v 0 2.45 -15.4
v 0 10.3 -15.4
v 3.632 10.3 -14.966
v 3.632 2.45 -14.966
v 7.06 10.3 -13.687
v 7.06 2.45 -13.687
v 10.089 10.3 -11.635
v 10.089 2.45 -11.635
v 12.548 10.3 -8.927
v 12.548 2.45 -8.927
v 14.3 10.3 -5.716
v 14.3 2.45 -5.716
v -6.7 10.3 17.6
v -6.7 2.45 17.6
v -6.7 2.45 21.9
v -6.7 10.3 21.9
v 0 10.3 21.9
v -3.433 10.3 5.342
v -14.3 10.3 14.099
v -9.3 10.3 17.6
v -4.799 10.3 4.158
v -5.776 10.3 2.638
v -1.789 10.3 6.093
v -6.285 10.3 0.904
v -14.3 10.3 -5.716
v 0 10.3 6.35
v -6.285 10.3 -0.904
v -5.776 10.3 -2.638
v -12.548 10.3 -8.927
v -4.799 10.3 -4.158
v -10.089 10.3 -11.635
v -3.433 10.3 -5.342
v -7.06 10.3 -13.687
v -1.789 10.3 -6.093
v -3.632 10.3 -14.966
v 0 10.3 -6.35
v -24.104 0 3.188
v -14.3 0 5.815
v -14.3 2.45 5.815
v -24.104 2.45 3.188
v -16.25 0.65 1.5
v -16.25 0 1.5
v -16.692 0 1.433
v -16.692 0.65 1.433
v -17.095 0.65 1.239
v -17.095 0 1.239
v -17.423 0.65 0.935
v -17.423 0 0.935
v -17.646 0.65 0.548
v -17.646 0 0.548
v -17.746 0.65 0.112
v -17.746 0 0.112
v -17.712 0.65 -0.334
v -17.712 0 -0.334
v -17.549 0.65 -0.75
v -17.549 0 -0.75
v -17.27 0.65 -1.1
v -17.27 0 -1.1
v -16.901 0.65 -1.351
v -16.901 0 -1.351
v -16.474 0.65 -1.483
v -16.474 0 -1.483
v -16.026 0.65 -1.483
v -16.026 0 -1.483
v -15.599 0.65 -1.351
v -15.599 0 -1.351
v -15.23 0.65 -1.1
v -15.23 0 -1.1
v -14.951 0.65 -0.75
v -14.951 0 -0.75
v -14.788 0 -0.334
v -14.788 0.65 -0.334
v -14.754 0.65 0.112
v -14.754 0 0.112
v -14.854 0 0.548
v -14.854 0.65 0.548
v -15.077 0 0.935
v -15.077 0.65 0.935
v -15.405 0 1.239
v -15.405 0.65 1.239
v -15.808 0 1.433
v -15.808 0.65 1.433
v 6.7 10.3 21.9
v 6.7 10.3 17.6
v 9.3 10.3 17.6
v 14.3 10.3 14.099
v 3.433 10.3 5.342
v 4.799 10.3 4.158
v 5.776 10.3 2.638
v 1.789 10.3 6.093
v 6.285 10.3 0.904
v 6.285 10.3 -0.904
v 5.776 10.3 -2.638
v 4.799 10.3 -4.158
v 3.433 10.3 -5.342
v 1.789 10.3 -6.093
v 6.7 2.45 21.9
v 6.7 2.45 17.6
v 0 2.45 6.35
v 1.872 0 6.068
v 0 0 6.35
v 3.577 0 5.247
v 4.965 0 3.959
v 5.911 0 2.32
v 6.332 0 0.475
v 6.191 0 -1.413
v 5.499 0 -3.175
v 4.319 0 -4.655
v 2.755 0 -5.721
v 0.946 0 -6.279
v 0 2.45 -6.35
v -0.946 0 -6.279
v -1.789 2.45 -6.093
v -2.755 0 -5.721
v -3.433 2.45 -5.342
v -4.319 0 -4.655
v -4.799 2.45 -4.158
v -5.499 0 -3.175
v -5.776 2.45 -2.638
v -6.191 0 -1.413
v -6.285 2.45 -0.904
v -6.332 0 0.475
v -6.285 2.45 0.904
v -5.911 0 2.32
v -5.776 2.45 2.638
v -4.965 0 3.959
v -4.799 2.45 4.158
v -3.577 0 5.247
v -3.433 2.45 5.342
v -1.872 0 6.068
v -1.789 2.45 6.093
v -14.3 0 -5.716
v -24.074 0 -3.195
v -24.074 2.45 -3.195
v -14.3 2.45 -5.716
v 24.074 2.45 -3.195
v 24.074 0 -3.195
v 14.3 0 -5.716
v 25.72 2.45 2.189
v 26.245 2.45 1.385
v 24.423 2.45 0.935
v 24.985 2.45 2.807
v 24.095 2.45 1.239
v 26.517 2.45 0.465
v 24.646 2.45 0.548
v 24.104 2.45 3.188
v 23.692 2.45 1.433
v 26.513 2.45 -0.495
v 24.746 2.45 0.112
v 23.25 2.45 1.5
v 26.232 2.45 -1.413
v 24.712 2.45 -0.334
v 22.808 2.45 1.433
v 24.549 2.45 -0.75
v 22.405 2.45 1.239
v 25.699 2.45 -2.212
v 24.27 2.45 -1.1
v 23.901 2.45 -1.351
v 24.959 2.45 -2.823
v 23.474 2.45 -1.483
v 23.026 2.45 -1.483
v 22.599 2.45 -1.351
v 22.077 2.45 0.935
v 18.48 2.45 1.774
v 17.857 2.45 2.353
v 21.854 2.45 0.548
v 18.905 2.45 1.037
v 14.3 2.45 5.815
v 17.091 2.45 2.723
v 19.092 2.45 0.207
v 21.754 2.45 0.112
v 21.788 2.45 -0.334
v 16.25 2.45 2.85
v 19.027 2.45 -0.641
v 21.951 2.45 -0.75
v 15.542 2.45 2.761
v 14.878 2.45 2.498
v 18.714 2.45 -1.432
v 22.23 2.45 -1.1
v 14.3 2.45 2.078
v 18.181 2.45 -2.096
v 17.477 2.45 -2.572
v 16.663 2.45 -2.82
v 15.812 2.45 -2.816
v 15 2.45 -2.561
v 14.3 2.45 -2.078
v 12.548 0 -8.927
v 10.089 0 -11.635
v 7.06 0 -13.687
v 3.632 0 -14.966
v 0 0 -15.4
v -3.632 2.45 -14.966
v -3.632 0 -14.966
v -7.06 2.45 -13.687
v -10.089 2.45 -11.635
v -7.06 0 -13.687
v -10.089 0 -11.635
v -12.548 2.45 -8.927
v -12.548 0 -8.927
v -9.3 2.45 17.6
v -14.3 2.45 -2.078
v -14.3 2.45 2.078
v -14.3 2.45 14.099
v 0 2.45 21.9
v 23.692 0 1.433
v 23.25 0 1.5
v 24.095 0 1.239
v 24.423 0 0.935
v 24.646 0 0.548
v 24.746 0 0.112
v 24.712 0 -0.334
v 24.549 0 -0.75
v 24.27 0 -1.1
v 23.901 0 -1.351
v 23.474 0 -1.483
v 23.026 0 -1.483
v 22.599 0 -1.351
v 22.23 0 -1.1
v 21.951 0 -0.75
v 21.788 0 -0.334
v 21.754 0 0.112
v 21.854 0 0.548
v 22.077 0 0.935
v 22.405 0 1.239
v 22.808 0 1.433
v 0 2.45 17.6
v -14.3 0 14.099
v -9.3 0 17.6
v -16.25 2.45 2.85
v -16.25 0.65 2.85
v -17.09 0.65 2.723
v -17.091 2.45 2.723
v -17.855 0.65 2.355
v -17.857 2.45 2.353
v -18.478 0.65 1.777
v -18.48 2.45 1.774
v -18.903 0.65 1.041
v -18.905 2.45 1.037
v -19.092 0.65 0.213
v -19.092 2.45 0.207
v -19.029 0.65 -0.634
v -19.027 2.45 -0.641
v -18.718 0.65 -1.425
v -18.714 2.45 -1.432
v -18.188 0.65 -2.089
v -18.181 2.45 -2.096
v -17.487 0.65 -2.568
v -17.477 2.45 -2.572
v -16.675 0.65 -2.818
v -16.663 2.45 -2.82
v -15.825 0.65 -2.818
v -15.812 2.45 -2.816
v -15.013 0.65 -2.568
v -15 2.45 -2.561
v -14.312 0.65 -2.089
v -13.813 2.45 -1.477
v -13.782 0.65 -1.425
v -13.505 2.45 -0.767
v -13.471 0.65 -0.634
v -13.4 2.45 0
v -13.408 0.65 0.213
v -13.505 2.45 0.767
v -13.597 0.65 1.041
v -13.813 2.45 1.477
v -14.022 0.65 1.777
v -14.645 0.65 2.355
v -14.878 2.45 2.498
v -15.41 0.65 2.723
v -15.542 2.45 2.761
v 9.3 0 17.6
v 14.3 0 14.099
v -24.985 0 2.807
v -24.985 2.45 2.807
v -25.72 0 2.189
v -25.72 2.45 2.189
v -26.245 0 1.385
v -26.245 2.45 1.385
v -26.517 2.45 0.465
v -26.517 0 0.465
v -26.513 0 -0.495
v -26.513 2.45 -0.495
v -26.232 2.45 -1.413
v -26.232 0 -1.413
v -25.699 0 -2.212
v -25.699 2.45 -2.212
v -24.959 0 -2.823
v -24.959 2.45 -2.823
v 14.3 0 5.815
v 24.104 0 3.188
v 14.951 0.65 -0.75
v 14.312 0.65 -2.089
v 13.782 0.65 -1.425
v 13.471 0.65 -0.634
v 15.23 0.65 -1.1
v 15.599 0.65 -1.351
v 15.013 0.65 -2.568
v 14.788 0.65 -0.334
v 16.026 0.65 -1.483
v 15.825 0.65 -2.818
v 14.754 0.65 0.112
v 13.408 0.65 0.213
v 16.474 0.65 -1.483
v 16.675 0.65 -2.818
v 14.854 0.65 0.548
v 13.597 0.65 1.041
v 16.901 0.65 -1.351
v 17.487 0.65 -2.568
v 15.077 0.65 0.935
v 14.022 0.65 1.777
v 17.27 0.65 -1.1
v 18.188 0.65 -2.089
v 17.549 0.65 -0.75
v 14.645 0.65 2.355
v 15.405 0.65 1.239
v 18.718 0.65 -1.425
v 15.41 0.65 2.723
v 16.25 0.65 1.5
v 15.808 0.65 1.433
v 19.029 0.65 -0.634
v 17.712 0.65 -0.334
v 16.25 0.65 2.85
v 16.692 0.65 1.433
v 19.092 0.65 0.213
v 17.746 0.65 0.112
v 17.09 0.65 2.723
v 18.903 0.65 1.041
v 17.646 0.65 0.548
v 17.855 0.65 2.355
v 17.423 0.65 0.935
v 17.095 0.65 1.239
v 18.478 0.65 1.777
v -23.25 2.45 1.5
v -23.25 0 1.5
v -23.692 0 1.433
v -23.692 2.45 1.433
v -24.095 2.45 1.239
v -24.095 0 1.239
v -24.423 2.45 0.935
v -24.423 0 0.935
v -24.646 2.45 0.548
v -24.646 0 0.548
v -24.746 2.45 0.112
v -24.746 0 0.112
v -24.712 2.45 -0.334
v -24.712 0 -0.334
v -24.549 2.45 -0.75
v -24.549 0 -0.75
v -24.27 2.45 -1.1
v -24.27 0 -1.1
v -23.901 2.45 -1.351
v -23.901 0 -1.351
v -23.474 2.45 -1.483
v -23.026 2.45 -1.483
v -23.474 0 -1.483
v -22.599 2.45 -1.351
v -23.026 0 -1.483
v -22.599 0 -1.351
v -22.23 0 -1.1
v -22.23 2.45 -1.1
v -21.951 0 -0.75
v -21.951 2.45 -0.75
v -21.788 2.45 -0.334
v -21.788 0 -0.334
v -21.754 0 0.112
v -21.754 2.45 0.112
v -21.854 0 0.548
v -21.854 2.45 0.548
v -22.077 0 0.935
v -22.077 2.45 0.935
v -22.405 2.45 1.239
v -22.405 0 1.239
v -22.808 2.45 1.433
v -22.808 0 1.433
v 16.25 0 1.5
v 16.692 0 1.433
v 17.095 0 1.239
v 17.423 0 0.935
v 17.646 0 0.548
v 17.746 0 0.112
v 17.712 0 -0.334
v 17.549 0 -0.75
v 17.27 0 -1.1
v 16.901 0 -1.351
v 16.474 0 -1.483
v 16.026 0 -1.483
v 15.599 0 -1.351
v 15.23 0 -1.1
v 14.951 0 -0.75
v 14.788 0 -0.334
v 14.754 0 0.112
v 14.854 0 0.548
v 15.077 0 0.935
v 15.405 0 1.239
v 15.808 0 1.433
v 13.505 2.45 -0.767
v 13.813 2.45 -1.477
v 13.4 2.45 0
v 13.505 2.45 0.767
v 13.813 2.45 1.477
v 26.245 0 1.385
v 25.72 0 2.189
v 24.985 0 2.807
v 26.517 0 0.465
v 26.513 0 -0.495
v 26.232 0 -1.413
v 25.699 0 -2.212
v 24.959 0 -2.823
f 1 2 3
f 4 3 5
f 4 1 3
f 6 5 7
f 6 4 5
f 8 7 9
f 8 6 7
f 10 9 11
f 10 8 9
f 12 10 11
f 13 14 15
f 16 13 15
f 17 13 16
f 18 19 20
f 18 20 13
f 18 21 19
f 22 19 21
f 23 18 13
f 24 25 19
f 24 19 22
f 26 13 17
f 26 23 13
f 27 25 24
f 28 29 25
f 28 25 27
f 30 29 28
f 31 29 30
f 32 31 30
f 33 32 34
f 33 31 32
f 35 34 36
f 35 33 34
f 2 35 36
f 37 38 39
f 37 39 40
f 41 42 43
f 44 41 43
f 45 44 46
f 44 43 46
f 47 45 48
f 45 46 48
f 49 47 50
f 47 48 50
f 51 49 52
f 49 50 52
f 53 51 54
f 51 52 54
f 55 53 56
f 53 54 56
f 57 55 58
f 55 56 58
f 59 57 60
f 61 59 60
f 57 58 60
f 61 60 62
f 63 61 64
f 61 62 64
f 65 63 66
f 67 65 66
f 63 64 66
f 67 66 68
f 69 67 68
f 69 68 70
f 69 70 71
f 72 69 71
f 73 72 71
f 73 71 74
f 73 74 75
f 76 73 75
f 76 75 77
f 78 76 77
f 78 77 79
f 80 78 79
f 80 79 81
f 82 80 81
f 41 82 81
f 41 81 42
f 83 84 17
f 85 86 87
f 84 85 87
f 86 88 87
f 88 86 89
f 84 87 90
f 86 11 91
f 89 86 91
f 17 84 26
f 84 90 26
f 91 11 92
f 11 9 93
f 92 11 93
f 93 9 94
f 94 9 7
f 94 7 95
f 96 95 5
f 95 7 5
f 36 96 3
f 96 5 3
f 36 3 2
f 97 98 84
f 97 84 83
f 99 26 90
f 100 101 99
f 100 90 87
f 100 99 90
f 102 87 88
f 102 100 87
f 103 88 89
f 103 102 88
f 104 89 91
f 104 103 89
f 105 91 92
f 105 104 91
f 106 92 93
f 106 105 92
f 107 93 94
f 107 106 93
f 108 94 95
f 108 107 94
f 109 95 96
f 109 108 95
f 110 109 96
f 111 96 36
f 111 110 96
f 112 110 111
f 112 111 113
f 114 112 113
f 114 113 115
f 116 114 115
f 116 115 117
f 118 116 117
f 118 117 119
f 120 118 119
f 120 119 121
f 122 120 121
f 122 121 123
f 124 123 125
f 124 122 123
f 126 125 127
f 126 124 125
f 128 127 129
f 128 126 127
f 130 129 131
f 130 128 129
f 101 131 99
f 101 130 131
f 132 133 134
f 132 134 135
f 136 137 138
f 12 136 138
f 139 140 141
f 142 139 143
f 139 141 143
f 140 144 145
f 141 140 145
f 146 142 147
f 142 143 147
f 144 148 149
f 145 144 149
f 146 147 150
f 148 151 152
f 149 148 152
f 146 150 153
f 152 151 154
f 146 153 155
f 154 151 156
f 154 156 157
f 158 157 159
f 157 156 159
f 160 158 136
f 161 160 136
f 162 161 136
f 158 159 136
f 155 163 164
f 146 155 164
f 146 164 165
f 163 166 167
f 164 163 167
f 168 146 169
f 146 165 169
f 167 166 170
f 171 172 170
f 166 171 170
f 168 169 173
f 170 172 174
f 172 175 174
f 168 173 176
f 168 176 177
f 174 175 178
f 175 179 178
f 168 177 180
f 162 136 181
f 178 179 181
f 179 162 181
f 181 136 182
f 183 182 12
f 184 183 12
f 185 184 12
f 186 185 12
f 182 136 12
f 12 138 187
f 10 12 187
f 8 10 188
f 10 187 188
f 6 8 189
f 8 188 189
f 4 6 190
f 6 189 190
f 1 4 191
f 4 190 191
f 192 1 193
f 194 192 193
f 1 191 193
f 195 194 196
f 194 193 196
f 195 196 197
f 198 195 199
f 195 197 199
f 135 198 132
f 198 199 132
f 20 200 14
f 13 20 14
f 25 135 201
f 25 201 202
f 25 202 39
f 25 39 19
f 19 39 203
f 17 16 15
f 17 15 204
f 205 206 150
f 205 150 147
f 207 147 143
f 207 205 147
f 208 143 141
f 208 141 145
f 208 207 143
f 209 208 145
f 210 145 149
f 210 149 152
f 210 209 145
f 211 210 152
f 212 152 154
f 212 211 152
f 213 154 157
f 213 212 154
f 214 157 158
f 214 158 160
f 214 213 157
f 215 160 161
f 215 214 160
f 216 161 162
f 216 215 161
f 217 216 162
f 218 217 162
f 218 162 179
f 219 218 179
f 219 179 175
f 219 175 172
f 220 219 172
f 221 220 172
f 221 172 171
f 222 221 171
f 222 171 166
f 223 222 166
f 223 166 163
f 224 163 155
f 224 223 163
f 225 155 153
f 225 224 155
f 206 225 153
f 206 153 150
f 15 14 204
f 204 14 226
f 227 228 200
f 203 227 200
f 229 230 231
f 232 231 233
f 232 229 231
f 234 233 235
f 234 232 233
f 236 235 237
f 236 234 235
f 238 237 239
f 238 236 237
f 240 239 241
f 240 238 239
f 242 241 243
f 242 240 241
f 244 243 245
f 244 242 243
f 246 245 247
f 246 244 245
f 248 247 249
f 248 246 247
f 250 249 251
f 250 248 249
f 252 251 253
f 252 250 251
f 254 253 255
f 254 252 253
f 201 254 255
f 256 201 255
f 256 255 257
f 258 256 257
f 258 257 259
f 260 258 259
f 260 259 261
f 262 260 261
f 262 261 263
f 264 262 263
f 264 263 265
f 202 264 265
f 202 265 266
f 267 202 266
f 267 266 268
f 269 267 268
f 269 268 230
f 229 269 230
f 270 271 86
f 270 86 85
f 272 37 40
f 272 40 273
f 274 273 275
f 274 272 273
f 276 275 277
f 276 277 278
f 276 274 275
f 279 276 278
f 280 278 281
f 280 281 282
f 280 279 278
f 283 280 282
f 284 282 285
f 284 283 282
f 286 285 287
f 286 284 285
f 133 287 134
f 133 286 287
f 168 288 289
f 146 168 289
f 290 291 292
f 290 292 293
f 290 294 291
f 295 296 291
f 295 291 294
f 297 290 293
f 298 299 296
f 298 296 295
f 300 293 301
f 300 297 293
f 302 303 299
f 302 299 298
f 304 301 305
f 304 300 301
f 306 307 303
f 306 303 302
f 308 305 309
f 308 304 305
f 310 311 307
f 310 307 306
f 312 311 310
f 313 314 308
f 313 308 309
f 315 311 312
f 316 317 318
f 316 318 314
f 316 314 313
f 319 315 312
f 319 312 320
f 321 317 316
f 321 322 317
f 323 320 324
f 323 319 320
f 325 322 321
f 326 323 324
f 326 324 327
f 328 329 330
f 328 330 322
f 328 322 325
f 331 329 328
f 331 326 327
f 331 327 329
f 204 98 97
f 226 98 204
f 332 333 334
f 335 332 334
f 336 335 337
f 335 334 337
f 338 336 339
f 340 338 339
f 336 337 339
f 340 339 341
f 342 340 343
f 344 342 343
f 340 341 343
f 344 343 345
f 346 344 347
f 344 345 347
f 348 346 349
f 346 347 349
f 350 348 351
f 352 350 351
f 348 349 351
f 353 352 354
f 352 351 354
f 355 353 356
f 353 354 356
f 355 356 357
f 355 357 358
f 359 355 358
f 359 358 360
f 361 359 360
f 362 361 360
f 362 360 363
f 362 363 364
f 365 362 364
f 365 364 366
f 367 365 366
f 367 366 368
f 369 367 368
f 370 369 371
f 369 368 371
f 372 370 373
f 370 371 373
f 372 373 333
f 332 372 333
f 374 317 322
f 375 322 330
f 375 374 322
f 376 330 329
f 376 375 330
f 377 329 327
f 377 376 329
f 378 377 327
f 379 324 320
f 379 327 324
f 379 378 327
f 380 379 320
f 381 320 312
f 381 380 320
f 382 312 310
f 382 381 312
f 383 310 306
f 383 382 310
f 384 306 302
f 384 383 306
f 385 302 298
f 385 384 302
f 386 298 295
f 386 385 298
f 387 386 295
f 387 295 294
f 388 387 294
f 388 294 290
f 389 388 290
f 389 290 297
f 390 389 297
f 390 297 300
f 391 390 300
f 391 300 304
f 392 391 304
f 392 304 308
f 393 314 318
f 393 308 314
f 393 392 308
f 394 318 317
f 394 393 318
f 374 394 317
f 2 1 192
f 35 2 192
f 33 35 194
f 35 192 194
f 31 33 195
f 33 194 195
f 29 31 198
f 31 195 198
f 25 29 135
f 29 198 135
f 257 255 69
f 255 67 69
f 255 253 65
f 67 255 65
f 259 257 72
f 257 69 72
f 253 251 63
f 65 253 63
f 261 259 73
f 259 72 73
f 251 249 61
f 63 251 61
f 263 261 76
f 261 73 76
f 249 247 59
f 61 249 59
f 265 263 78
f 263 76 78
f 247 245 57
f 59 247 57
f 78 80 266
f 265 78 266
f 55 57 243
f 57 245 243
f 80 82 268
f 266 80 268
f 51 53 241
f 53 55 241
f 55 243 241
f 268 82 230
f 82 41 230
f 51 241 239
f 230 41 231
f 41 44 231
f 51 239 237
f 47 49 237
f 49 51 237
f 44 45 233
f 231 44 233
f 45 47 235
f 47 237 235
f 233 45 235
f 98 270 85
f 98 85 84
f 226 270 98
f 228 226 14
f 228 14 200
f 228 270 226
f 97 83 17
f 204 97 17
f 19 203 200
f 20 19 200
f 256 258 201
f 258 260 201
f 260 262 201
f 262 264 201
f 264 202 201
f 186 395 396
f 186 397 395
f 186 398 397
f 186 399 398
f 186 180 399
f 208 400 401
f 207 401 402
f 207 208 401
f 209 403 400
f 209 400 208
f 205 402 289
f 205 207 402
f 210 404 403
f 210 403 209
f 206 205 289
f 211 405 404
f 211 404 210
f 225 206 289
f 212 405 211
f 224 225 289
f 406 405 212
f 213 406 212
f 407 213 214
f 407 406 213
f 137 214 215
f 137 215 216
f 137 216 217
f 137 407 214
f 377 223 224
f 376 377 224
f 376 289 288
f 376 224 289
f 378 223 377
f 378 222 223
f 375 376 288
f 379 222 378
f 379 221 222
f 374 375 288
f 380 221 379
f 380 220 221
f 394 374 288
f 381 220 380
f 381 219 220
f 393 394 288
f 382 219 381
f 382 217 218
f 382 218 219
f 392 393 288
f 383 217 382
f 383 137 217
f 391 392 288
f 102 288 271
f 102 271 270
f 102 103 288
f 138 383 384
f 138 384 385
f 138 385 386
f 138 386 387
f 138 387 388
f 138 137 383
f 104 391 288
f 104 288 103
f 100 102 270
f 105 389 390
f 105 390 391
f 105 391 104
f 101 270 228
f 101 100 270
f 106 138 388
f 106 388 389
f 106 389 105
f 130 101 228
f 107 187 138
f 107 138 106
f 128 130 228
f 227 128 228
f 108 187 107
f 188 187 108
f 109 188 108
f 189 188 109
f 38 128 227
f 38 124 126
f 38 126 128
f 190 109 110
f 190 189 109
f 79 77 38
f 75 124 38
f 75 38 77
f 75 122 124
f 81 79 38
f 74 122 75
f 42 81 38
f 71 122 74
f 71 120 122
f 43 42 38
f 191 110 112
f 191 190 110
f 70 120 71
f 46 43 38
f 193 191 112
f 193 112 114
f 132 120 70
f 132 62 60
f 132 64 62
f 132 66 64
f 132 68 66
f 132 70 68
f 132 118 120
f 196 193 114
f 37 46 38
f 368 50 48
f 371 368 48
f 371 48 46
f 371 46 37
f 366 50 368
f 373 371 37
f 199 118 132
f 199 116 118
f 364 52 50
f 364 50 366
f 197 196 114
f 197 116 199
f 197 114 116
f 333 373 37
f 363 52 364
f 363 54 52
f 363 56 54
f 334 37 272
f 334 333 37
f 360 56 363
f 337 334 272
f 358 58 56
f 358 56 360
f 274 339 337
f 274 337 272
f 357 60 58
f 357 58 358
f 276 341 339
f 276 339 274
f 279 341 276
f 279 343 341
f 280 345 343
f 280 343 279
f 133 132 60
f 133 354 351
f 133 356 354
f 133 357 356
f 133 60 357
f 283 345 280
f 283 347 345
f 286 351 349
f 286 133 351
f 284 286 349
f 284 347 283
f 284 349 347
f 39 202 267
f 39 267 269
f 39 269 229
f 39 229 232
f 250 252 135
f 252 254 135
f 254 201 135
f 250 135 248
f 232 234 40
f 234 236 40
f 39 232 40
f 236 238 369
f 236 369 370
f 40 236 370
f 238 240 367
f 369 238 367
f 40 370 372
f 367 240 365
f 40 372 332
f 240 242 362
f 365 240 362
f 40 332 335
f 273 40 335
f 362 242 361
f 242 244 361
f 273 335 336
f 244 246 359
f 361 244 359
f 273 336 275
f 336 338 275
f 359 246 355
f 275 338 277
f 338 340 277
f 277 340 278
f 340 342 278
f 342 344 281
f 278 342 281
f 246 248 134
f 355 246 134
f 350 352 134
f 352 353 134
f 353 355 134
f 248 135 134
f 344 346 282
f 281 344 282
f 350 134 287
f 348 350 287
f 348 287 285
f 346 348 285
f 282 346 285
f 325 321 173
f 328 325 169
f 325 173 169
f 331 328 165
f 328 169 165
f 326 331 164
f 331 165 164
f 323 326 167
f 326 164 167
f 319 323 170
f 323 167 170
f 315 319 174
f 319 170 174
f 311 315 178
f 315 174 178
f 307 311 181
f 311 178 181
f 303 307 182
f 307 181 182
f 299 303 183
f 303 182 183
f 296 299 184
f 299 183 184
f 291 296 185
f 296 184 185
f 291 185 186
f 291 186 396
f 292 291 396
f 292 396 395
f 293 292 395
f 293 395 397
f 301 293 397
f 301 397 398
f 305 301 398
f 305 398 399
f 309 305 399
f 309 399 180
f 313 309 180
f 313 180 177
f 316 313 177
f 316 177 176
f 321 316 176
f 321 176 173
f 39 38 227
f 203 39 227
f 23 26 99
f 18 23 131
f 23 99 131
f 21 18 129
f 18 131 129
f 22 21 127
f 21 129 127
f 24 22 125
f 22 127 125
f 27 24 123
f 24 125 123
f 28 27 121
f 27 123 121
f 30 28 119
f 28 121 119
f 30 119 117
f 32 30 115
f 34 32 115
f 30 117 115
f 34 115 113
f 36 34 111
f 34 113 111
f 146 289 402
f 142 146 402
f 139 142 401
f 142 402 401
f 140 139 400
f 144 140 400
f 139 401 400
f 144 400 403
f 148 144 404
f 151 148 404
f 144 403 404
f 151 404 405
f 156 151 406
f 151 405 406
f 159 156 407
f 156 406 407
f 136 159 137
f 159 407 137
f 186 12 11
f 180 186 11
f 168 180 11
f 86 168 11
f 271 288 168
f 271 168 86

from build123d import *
from build123d.topology import SkipClean

# Parameters (mm, degrees)
SKETCH1_R           = 6.35
BOSS_EXTRUDE1_DEPTH = 2.45
SKETCH2_R           = 1.5
BOSS_EXTRUDE2_DEPTH = 2.45
SKETCH3_R           = 2.85
CUT_EXTRUDE1_DEPTH  = 1.8
CHAMFER1_SIZE       = 5
CHAMFER1_SIZE2      = 3.501037691
BOSS_EXTRUDE3_DEPTH = 7.85


with BuildPart() as part:
    # Sketch1 → Boss-Extrude1 (new body)
    with BuildSketch(Plane(origin=(0, 0, 0), x_dir=(1, 0, 0), z_dir=(0, 1, 0))):
        with BuildLine():
            Line((-14.3, -17.6), (14.3, -17.6))
            Line((14.3, -17.6), (14.3, 5.715767665))
            ThreePointArc((14.3, 5.715767665), (0, 15.4), (-14.3, 5.715767665))
            Line((-14.3, 5.715767665), (-14.3, -17.6))
        make_face()
        with Locations(Location((0, 0, 0), (0, 0, 270))):
            Circle(SKETCH1_R, mode=Mode.SUBTRACT)
    extrude(amount=BOSS_EXTRUDE1_DEPTH)

    # Sketch2 → Boss-Extrude2 (add)
    with BuildSketch(Plane(origin=(0, 0, 0), x_dir=(1, 0, 0), z_dir=(0, 1, 0))):
        with BuildLine():
            ThreePointArc((24.104102849, -3.187555227), (26.549963246, 0.015574774), (24.073976981, 3.195475228))
            Line((24.073976981, 3.195475228), (14.3, 5.715767665))
            Line((14.3, 5.715767665), (14.3, -5.814556668))
            Line((14.3, -5.814556668), (24.104102849, -3.187555227))
        make_face()
        with Locations(Location((16.25, 0, 0), (0, 0, 270))):
            Circle(SKETCH2_R, mode=Mode.SUBTRACT)
        with Locations(Location((23.25, 0, 0), (0, 0, 270))):
            Circle(SKETCH2_R, mode=Mode.SUBTRACT)
    boss_extrude2 = extrude(amount=BOSS_EXTRUDE2_DEPTH)

    # Sketch3 → Cut-Extrude1 (cut)
    with BuildSketch(Plane(origin=(0, 2.45, 0), x_dir=(1, 0, 0), z_dir=(0, 1, 0))):
        with Locations(Location((16.25, 0, 0), (0, 0, 270))):
            Circle(SKETCH3_R)
    cut_extrude1 = extrude(amount=-CUT_EXTRUDE1_DEPTH, mode=Mode.SUBTRACT)

    # Mirror1: Boss-Extrude2, Cut-Extrude1 across plane
    add(boss_extrude2.mirror(Plane(origin=(0, 0, 0), x_dir=(0, 0, 1), z_dir=(1, 0, 0))))
    add(cut_extrude1.mirror(Plane(origin=(0, 0, 0), x_dir=(0, 0, 1), z_dir=(1, 0, 0))), mode=Mode.SUBTRACT)

    # Chamfer1
    chamfer1_edges = [part.edges().sort_by_distance(p)[0] for p in [
        (-14.3, 1.225, 17.6),
        (14.3, 1.225, 17.6),
    ]]
    chamfer1_side = [part.faces().sort_by_distance(p)[0] for p in [
        (0, 1.225, 17.6),
    ]]
    chamfer(chamfer1_edges, length=CHAMFER1_SIZE, length2=CHAMFER1_SIZE2, reference=chamfer1_side[0])

    # Sketch5 → Boss-Extrude3 (add)
    with BuildSketch(Plane(origin=(0, 2.45, 0), x_dir=(1, 0, 0), z_dir=(0, 1, 0))):
        with BuildLine():
            Line((14.3, 5.715767665), (14.3, -14.098962309))
            Line((14.3, -14.098962309), (9.3, -17.6))
            Line((9.3, -17.6), (6.7, -17.6))
            Line((6.7, -17.6), (6.7, -21.9))
            Line((6.7, -21.9), (0, -21.9))
            Line((0, -21.9), (0, -6.35))
            ThreePointArc((0, -6.35), (6.35, 0), (0, 6.35))
            Line((0, 6.35), (0, 15.4))
            ThreePointArc((0, 15.4), (8.63531059, 12.751133715), (14.3, 5.715767665))
        make_face()
    boss_extrude3 = extrude(amount=BOSS_EXTRUDE3_DEPTH)

    # Mirror2: Boss-Extrude3 across plane
    with SkipClean():  # the faces are left unmerged after this step: merging them gives an invalid solid
        add(boss_extrude3.mirror(Plane(origin=(0, 0, 0), x_dir=(0, 0, 1), z_dir=(1, 0, 0))))


solid = part.part
